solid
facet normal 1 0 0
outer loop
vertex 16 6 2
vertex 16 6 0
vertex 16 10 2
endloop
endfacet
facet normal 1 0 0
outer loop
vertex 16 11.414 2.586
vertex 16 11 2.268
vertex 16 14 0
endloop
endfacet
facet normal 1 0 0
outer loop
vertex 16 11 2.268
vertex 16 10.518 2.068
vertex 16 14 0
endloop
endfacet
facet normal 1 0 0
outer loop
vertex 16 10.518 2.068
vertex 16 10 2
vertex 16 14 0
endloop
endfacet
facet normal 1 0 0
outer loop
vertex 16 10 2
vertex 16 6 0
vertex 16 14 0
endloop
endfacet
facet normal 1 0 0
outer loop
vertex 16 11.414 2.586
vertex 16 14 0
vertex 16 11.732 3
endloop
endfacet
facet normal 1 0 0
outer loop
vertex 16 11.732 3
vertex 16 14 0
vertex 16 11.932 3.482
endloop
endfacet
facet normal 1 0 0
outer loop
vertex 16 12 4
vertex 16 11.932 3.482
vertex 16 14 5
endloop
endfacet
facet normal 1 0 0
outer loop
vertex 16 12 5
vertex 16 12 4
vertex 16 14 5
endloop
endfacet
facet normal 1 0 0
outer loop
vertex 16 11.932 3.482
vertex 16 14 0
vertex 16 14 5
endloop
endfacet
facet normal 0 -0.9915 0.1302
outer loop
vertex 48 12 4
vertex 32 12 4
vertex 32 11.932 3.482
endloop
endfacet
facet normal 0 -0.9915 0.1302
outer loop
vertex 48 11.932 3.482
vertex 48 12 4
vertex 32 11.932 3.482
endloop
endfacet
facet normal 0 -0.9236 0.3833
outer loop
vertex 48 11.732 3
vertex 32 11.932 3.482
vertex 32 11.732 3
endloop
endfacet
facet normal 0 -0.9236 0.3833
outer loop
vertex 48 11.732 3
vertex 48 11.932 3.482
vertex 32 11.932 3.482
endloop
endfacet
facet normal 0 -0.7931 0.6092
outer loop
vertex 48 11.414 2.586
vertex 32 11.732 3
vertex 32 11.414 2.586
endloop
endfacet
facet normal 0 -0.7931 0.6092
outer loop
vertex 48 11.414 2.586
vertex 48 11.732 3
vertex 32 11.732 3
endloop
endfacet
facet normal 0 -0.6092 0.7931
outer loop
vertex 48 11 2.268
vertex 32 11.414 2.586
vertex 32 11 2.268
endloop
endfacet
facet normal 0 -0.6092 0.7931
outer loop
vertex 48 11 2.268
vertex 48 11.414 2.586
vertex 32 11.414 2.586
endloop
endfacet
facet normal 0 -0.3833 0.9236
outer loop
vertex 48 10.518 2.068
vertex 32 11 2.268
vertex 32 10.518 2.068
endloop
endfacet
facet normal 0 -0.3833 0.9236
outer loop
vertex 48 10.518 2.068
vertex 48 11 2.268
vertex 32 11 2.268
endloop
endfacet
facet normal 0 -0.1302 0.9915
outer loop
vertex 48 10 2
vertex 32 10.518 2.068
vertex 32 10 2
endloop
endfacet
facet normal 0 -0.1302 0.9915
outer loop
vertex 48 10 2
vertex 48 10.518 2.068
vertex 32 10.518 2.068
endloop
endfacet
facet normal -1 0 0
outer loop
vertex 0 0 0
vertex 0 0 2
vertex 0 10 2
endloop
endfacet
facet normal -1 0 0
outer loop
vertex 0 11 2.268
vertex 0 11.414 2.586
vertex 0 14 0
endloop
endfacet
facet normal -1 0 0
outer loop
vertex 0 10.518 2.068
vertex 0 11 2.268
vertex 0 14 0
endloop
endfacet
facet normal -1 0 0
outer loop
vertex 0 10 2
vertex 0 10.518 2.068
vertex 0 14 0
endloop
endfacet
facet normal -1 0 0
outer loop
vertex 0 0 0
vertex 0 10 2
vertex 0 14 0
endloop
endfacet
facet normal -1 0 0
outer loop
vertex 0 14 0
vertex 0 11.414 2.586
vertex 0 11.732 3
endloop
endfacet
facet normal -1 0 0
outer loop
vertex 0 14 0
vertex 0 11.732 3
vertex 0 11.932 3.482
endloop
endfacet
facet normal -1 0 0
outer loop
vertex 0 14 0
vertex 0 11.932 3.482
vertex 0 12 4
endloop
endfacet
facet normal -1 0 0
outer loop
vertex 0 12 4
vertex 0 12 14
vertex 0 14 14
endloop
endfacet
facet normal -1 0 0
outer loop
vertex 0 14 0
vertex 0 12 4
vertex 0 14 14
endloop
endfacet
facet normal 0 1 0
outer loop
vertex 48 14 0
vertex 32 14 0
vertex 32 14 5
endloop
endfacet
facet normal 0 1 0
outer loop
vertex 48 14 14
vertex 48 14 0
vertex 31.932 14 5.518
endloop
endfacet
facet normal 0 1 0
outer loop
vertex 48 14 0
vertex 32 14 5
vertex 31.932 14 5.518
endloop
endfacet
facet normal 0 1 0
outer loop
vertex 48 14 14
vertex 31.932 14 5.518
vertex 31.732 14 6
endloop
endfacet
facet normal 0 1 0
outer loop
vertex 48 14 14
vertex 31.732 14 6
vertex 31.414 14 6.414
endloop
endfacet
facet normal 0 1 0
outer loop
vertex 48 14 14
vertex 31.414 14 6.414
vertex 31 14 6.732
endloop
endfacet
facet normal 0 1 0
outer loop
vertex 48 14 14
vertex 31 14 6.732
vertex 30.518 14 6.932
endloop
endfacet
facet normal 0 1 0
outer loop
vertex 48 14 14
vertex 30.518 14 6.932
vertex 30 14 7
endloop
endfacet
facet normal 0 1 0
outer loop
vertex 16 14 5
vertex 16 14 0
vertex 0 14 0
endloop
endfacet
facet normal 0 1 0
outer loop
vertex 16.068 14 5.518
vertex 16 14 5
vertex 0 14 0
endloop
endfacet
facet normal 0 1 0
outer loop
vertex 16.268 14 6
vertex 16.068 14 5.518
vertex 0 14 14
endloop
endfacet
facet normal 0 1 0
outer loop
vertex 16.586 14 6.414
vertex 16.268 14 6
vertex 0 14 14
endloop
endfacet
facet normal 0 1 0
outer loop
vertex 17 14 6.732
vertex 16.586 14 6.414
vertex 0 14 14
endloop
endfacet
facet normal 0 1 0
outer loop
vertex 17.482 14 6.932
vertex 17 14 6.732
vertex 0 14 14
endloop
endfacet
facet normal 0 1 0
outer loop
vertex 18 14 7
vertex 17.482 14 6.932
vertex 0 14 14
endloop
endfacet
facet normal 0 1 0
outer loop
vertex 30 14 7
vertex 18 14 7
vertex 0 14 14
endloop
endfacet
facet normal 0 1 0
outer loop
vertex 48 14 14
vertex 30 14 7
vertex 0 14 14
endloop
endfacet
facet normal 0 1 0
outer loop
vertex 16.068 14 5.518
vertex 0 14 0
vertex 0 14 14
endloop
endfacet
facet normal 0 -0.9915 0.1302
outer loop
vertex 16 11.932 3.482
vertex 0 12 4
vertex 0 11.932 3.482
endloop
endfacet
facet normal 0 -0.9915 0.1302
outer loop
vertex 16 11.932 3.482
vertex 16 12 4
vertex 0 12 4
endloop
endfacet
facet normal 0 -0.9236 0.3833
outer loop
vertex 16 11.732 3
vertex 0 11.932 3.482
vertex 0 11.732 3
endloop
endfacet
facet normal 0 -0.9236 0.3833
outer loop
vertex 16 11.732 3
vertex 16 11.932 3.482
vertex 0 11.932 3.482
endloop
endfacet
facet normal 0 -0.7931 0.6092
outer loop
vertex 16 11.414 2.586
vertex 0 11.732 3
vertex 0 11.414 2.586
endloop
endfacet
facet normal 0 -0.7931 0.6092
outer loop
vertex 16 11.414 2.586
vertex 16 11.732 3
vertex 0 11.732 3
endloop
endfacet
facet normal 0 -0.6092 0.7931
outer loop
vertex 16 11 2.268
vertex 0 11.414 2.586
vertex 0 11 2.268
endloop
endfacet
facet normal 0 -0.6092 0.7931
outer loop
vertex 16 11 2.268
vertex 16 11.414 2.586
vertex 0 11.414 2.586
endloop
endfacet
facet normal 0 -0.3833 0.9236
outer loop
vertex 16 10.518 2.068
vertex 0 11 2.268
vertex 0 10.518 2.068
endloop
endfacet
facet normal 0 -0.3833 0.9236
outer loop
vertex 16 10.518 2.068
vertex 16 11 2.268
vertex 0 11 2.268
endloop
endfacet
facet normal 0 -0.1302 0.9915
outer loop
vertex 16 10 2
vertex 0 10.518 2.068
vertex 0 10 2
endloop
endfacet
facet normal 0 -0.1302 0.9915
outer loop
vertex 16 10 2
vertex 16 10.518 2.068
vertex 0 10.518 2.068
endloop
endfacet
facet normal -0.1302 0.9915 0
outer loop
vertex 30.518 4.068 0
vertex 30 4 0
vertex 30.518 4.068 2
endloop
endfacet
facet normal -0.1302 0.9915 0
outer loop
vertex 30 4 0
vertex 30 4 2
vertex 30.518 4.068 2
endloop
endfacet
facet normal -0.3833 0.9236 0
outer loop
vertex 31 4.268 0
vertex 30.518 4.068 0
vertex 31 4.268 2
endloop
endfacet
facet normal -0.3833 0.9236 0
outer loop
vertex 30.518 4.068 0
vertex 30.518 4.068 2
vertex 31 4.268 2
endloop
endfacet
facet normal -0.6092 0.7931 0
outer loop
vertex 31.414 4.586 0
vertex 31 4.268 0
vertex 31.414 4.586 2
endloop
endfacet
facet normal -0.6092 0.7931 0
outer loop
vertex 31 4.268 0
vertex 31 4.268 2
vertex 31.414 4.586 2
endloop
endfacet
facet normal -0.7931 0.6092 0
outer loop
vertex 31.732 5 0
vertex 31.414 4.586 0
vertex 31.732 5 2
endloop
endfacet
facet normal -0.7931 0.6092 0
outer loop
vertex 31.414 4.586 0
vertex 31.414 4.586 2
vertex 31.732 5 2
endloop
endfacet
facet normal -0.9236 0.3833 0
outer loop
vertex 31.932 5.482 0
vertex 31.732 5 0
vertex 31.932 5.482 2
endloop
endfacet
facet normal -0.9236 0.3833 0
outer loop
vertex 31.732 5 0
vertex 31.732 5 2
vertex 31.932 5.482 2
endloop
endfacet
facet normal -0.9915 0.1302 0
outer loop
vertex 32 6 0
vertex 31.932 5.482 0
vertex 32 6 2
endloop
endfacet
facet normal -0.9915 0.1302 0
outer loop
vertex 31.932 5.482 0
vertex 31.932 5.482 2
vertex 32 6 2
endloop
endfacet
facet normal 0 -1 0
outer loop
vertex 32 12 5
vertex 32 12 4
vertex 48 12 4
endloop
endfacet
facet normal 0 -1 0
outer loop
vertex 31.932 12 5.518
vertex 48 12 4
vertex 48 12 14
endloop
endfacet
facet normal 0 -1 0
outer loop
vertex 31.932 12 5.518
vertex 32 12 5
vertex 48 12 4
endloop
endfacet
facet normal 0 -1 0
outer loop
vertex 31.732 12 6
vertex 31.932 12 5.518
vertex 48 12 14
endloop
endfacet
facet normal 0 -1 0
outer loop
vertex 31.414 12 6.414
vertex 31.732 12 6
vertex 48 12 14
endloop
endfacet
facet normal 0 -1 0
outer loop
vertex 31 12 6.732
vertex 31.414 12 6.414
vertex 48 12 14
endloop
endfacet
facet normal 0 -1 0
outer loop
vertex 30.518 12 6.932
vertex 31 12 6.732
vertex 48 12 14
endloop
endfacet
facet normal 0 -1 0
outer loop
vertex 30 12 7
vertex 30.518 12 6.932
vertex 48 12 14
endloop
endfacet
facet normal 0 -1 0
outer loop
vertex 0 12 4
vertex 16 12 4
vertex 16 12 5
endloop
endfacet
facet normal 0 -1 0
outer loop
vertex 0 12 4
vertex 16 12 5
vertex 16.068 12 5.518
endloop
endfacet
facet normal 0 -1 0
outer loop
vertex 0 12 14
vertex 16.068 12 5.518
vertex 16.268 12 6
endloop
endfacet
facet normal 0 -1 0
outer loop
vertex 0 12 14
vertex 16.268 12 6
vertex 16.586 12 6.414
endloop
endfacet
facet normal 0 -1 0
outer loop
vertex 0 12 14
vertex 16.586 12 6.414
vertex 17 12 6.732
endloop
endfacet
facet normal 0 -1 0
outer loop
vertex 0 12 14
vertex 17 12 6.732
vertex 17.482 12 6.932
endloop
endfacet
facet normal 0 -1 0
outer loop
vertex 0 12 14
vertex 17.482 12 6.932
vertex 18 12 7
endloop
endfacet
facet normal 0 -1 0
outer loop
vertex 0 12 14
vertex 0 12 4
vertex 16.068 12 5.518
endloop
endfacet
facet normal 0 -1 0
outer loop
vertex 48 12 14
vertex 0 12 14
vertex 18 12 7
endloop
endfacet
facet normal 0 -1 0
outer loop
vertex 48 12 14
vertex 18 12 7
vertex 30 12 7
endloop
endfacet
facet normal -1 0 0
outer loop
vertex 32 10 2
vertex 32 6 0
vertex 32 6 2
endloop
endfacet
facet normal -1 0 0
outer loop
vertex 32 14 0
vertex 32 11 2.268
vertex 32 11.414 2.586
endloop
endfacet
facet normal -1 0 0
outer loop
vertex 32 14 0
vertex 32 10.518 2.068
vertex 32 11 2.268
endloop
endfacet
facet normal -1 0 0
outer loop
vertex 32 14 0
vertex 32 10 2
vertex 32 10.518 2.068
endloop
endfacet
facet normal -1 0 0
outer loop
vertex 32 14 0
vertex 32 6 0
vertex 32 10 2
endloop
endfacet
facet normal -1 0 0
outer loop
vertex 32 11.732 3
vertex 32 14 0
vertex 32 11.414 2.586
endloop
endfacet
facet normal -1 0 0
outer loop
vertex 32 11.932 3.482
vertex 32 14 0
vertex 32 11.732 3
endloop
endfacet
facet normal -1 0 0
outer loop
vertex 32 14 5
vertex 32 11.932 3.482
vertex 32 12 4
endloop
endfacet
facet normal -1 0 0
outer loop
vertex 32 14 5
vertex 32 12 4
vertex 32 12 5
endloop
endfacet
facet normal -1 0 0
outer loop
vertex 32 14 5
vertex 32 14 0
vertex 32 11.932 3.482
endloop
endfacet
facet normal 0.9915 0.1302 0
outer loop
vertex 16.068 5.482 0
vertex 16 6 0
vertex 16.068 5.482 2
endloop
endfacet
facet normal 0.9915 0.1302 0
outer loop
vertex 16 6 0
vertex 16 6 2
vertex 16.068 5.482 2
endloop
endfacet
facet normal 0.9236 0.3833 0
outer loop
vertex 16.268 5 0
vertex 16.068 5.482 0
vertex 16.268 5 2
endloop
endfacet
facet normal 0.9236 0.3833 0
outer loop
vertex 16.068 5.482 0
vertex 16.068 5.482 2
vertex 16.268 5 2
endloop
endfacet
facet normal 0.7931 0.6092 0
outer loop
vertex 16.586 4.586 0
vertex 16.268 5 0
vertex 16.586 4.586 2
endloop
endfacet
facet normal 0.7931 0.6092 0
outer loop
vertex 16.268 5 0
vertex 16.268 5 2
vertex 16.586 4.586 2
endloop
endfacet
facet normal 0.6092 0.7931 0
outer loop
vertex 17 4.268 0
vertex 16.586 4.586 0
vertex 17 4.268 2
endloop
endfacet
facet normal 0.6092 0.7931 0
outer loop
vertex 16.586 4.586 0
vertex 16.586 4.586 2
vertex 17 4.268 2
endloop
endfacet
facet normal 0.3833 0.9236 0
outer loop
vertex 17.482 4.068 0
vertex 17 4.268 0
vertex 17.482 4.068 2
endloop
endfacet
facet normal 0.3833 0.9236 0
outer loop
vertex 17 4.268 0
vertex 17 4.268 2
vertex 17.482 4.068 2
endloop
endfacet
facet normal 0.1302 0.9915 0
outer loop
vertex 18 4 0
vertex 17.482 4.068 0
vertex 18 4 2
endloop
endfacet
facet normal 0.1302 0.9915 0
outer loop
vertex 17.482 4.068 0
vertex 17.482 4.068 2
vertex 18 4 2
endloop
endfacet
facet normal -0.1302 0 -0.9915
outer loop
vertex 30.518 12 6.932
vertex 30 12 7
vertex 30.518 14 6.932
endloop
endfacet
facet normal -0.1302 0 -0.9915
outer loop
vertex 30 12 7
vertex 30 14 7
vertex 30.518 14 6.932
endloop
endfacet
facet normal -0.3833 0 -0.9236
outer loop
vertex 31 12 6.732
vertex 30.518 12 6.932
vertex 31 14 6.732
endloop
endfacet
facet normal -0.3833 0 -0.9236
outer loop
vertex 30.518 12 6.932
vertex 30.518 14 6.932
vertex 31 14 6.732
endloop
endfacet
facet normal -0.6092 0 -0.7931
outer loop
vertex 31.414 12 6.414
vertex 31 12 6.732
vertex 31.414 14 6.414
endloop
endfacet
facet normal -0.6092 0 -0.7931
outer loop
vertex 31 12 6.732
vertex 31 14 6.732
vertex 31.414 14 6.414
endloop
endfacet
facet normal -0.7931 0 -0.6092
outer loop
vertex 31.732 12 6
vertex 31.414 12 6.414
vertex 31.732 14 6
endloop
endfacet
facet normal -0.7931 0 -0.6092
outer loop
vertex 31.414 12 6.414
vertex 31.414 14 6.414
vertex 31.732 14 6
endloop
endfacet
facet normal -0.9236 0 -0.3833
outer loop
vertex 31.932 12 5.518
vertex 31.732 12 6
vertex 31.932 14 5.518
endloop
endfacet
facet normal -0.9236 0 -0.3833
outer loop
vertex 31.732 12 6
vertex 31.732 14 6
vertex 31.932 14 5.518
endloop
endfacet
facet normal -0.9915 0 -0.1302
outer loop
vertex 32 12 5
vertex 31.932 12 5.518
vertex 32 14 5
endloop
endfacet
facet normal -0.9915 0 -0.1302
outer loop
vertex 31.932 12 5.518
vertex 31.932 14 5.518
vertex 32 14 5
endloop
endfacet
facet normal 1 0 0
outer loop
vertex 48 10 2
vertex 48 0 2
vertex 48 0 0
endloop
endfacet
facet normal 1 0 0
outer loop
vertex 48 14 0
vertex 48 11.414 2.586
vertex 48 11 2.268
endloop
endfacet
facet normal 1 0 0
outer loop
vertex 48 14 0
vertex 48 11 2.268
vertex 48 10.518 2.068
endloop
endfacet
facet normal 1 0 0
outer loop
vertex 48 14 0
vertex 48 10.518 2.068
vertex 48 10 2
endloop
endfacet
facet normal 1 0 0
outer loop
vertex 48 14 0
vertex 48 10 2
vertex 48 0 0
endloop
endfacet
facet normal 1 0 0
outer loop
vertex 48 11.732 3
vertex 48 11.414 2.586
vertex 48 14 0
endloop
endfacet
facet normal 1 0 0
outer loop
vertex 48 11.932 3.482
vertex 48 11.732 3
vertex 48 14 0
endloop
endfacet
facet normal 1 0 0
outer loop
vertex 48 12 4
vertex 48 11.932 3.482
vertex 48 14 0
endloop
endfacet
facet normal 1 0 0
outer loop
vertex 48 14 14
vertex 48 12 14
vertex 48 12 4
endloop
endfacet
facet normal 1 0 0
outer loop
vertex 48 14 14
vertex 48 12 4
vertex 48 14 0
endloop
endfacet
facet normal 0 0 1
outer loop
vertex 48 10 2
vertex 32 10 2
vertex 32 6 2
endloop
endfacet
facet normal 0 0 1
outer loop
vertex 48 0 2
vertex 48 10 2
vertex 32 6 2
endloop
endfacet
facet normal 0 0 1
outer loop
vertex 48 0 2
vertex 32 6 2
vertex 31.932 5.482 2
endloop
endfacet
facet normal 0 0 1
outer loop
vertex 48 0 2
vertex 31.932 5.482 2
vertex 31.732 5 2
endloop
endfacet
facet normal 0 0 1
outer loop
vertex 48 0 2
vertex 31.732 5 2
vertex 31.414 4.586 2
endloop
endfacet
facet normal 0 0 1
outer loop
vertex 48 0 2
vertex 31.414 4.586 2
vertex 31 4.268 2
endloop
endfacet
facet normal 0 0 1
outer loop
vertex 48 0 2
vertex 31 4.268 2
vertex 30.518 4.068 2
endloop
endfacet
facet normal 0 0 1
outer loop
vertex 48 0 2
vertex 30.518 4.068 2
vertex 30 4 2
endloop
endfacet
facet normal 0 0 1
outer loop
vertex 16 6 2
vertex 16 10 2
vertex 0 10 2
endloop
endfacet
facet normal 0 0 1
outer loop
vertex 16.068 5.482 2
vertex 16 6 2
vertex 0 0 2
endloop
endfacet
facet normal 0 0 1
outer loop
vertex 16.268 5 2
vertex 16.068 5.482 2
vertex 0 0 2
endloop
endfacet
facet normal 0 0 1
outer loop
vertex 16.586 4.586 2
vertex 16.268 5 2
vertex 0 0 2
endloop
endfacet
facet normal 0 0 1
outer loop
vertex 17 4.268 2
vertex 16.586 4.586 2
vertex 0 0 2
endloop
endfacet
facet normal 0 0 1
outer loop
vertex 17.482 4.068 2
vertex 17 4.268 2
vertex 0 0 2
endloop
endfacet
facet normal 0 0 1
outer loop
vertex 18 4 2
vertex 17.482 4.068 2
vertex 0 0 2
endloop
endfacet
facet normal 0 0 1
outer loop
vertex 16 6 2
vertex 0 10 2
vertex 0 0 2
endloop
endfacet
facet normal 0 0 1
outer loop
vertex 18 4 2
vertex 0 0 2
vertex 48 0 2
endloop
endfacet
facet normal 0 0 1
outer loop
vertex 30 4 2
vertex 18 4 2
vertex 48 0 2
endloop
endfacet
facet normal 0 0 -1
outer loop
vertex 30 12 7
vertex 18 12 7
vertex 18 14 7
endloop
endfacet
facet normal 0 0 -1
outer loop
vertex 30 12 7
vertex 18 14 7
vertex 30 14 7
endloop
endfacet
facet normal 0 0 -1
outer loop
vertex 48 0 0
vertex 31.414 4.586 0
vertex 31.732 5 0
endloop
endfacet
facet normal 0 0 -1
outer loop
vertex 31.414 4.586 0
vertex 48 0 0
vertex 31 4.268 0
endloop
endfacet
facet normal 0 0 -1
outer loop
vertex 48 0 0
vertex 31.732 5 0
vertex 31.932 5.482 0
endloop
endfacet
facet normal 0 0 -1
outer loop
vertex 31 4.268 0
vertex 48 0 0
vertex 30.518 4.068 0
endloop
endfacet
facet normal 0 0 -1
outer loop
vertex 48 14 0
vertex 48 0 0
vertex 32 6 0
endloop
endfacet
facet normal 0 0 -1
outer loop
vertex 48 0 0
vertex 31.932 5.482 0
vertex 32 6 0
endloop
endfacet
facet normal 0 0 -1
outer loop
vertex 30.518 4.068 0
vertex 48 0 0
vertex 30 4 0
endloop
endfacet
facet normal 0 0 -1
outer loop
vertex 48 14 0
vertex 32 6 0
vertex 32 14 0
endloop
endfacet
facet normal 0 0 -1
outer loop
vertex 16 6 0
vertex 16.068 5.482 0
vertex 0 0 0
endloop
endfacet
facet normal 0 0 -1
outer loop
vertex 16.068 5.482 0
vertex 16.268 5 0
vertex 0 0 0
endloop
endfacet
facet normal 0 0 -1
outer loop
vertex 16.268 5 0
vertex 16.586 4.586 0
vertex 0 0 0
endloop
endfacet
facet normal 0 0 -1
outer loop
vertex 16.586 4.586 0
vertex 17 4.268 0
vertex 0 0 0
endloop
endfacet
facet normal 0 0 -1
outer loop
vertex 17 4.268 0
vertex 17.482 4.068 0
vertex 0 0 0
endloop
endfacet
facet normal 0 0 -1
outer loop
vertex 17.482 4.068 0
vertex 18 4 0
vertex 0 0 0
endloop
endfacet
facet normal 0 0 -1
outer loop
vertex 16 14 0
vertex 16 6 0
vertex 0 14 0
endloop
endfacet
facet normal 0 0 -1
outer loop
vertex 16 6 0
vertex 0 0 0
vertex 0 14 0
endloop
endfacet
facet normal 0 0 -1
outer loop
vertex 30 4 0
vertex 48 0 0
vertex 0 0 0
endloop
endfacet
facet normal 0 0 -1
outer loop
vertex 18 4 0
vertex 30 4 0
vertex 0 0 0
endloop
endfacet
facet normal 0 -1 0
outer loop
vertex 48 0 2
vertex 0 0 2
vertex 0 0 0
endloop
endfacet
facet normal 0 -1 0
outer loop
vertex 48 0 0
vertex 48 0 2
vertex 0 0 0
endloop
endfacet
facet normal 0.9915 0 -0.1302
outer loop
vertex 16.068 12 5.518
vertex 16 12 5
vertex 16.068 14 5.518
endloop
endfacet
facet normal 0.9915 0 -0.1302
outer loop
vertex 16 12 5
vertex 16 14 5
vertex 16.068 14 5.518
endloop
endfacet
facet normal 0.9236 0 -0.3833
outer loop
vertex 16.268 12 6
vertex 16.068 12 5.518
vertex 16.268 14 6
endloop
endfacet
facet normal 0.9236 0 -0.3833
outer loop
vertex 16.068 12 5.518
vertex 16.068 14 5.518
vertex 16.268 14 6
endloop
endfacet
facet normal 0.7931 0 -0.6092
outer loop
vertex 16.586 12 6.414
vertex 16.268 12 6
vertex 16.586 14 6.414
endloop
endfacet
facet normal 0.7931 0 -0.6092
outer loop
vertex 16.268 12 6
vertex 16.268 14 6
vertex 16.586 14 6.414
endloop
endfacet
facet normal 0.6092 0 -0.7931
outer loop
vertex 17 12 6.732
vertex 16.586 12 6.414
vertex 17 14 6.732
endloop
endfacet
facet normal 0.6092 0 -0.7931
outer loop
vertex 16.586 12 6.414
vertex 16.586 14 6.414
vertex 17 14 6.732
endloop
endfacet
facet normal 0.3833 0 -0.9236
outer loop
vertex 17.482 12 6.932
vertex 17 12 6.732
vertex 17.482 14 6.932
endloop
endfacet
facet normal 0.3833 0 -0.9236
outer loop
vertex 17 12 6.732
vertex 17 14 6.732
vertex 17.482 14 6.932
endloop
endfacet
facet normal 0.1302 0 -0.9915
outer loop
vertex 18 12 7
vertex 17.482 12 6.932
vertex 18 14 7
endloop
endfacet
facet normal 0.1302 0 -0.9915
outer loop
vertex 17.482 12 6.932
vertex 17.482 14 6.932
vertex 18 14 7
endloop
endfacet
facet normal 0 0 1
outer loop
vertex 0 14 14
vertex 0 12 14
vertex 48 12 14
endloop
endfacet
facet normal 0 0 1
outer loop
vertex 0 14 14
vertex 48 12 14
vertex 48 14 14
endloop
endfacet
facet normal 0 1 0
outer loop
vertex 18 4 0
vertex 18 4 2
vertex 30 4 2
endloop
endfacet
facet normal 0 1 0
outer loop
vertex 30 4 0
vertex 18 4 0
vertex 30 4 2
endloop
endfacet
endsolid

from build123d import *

# Parameters (mm, degrees)
F0_W          = 2
F0_H          = 12
F1_DEPTH      = 48
F2_W          = 16
F2_H          = 7
F3_DEPTH      = 2.001
F3_DEPTH_BACK = 8
F4_R          = 2


with BuildPart() as f1:
    # F0 (on Right) → F1 (new body)
    with BuildSketch(Plane.YZ):
        Polygon((0, 2), (0, 0), (14, 0), (14, 2), (12, 2), align=None)
        with Locations((13, 8)):
            Rectangle(F0_W, F0_H)
    extrude(amount=F1_DEPTH)

    # F2 (on face) → F3 (cut, two sides)
    with BuildSketch(Plane.XZ.offset(-12)) as f3_sk:
        with Locations((24, 3.5)):
            Rectangle(F2_W, F2_H)
    extrude(amount=-F3_DEPTH, mode=Mode.SUBTRACT)
    extrude(f3_sk.sketch, amount=F3_DEPTH_BACK, mode=Mode.SUBTRACT)

    # F4
    f4_edges = [f1.edges().sort_by_distance(p)[0] for p in [
        (32, 4, 1),
        (16, 4, 1),
        (16, 13, 7),
        (32, 13, 7),
        (40, 12, 2),
        (8, 12, 2),
    ]]
    fillet(f4_edges, radius=F4_R)


solid = f1.part
